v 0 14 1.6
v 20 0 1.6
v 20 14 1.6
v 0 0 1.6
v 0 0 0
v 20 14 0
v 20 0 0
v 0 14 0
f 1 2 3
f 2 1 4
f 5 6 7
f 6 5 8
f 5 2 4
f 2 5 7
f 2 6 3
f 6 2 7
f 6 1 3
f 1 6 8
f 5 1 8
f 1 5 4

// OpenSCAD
$fn = 64;

board_x = 20.0;
board_y = 14.0;
board_z = 1.6;

color([0.05, 0.45, 0.12])
cube([board_x, board_y, board_z], center=false);
